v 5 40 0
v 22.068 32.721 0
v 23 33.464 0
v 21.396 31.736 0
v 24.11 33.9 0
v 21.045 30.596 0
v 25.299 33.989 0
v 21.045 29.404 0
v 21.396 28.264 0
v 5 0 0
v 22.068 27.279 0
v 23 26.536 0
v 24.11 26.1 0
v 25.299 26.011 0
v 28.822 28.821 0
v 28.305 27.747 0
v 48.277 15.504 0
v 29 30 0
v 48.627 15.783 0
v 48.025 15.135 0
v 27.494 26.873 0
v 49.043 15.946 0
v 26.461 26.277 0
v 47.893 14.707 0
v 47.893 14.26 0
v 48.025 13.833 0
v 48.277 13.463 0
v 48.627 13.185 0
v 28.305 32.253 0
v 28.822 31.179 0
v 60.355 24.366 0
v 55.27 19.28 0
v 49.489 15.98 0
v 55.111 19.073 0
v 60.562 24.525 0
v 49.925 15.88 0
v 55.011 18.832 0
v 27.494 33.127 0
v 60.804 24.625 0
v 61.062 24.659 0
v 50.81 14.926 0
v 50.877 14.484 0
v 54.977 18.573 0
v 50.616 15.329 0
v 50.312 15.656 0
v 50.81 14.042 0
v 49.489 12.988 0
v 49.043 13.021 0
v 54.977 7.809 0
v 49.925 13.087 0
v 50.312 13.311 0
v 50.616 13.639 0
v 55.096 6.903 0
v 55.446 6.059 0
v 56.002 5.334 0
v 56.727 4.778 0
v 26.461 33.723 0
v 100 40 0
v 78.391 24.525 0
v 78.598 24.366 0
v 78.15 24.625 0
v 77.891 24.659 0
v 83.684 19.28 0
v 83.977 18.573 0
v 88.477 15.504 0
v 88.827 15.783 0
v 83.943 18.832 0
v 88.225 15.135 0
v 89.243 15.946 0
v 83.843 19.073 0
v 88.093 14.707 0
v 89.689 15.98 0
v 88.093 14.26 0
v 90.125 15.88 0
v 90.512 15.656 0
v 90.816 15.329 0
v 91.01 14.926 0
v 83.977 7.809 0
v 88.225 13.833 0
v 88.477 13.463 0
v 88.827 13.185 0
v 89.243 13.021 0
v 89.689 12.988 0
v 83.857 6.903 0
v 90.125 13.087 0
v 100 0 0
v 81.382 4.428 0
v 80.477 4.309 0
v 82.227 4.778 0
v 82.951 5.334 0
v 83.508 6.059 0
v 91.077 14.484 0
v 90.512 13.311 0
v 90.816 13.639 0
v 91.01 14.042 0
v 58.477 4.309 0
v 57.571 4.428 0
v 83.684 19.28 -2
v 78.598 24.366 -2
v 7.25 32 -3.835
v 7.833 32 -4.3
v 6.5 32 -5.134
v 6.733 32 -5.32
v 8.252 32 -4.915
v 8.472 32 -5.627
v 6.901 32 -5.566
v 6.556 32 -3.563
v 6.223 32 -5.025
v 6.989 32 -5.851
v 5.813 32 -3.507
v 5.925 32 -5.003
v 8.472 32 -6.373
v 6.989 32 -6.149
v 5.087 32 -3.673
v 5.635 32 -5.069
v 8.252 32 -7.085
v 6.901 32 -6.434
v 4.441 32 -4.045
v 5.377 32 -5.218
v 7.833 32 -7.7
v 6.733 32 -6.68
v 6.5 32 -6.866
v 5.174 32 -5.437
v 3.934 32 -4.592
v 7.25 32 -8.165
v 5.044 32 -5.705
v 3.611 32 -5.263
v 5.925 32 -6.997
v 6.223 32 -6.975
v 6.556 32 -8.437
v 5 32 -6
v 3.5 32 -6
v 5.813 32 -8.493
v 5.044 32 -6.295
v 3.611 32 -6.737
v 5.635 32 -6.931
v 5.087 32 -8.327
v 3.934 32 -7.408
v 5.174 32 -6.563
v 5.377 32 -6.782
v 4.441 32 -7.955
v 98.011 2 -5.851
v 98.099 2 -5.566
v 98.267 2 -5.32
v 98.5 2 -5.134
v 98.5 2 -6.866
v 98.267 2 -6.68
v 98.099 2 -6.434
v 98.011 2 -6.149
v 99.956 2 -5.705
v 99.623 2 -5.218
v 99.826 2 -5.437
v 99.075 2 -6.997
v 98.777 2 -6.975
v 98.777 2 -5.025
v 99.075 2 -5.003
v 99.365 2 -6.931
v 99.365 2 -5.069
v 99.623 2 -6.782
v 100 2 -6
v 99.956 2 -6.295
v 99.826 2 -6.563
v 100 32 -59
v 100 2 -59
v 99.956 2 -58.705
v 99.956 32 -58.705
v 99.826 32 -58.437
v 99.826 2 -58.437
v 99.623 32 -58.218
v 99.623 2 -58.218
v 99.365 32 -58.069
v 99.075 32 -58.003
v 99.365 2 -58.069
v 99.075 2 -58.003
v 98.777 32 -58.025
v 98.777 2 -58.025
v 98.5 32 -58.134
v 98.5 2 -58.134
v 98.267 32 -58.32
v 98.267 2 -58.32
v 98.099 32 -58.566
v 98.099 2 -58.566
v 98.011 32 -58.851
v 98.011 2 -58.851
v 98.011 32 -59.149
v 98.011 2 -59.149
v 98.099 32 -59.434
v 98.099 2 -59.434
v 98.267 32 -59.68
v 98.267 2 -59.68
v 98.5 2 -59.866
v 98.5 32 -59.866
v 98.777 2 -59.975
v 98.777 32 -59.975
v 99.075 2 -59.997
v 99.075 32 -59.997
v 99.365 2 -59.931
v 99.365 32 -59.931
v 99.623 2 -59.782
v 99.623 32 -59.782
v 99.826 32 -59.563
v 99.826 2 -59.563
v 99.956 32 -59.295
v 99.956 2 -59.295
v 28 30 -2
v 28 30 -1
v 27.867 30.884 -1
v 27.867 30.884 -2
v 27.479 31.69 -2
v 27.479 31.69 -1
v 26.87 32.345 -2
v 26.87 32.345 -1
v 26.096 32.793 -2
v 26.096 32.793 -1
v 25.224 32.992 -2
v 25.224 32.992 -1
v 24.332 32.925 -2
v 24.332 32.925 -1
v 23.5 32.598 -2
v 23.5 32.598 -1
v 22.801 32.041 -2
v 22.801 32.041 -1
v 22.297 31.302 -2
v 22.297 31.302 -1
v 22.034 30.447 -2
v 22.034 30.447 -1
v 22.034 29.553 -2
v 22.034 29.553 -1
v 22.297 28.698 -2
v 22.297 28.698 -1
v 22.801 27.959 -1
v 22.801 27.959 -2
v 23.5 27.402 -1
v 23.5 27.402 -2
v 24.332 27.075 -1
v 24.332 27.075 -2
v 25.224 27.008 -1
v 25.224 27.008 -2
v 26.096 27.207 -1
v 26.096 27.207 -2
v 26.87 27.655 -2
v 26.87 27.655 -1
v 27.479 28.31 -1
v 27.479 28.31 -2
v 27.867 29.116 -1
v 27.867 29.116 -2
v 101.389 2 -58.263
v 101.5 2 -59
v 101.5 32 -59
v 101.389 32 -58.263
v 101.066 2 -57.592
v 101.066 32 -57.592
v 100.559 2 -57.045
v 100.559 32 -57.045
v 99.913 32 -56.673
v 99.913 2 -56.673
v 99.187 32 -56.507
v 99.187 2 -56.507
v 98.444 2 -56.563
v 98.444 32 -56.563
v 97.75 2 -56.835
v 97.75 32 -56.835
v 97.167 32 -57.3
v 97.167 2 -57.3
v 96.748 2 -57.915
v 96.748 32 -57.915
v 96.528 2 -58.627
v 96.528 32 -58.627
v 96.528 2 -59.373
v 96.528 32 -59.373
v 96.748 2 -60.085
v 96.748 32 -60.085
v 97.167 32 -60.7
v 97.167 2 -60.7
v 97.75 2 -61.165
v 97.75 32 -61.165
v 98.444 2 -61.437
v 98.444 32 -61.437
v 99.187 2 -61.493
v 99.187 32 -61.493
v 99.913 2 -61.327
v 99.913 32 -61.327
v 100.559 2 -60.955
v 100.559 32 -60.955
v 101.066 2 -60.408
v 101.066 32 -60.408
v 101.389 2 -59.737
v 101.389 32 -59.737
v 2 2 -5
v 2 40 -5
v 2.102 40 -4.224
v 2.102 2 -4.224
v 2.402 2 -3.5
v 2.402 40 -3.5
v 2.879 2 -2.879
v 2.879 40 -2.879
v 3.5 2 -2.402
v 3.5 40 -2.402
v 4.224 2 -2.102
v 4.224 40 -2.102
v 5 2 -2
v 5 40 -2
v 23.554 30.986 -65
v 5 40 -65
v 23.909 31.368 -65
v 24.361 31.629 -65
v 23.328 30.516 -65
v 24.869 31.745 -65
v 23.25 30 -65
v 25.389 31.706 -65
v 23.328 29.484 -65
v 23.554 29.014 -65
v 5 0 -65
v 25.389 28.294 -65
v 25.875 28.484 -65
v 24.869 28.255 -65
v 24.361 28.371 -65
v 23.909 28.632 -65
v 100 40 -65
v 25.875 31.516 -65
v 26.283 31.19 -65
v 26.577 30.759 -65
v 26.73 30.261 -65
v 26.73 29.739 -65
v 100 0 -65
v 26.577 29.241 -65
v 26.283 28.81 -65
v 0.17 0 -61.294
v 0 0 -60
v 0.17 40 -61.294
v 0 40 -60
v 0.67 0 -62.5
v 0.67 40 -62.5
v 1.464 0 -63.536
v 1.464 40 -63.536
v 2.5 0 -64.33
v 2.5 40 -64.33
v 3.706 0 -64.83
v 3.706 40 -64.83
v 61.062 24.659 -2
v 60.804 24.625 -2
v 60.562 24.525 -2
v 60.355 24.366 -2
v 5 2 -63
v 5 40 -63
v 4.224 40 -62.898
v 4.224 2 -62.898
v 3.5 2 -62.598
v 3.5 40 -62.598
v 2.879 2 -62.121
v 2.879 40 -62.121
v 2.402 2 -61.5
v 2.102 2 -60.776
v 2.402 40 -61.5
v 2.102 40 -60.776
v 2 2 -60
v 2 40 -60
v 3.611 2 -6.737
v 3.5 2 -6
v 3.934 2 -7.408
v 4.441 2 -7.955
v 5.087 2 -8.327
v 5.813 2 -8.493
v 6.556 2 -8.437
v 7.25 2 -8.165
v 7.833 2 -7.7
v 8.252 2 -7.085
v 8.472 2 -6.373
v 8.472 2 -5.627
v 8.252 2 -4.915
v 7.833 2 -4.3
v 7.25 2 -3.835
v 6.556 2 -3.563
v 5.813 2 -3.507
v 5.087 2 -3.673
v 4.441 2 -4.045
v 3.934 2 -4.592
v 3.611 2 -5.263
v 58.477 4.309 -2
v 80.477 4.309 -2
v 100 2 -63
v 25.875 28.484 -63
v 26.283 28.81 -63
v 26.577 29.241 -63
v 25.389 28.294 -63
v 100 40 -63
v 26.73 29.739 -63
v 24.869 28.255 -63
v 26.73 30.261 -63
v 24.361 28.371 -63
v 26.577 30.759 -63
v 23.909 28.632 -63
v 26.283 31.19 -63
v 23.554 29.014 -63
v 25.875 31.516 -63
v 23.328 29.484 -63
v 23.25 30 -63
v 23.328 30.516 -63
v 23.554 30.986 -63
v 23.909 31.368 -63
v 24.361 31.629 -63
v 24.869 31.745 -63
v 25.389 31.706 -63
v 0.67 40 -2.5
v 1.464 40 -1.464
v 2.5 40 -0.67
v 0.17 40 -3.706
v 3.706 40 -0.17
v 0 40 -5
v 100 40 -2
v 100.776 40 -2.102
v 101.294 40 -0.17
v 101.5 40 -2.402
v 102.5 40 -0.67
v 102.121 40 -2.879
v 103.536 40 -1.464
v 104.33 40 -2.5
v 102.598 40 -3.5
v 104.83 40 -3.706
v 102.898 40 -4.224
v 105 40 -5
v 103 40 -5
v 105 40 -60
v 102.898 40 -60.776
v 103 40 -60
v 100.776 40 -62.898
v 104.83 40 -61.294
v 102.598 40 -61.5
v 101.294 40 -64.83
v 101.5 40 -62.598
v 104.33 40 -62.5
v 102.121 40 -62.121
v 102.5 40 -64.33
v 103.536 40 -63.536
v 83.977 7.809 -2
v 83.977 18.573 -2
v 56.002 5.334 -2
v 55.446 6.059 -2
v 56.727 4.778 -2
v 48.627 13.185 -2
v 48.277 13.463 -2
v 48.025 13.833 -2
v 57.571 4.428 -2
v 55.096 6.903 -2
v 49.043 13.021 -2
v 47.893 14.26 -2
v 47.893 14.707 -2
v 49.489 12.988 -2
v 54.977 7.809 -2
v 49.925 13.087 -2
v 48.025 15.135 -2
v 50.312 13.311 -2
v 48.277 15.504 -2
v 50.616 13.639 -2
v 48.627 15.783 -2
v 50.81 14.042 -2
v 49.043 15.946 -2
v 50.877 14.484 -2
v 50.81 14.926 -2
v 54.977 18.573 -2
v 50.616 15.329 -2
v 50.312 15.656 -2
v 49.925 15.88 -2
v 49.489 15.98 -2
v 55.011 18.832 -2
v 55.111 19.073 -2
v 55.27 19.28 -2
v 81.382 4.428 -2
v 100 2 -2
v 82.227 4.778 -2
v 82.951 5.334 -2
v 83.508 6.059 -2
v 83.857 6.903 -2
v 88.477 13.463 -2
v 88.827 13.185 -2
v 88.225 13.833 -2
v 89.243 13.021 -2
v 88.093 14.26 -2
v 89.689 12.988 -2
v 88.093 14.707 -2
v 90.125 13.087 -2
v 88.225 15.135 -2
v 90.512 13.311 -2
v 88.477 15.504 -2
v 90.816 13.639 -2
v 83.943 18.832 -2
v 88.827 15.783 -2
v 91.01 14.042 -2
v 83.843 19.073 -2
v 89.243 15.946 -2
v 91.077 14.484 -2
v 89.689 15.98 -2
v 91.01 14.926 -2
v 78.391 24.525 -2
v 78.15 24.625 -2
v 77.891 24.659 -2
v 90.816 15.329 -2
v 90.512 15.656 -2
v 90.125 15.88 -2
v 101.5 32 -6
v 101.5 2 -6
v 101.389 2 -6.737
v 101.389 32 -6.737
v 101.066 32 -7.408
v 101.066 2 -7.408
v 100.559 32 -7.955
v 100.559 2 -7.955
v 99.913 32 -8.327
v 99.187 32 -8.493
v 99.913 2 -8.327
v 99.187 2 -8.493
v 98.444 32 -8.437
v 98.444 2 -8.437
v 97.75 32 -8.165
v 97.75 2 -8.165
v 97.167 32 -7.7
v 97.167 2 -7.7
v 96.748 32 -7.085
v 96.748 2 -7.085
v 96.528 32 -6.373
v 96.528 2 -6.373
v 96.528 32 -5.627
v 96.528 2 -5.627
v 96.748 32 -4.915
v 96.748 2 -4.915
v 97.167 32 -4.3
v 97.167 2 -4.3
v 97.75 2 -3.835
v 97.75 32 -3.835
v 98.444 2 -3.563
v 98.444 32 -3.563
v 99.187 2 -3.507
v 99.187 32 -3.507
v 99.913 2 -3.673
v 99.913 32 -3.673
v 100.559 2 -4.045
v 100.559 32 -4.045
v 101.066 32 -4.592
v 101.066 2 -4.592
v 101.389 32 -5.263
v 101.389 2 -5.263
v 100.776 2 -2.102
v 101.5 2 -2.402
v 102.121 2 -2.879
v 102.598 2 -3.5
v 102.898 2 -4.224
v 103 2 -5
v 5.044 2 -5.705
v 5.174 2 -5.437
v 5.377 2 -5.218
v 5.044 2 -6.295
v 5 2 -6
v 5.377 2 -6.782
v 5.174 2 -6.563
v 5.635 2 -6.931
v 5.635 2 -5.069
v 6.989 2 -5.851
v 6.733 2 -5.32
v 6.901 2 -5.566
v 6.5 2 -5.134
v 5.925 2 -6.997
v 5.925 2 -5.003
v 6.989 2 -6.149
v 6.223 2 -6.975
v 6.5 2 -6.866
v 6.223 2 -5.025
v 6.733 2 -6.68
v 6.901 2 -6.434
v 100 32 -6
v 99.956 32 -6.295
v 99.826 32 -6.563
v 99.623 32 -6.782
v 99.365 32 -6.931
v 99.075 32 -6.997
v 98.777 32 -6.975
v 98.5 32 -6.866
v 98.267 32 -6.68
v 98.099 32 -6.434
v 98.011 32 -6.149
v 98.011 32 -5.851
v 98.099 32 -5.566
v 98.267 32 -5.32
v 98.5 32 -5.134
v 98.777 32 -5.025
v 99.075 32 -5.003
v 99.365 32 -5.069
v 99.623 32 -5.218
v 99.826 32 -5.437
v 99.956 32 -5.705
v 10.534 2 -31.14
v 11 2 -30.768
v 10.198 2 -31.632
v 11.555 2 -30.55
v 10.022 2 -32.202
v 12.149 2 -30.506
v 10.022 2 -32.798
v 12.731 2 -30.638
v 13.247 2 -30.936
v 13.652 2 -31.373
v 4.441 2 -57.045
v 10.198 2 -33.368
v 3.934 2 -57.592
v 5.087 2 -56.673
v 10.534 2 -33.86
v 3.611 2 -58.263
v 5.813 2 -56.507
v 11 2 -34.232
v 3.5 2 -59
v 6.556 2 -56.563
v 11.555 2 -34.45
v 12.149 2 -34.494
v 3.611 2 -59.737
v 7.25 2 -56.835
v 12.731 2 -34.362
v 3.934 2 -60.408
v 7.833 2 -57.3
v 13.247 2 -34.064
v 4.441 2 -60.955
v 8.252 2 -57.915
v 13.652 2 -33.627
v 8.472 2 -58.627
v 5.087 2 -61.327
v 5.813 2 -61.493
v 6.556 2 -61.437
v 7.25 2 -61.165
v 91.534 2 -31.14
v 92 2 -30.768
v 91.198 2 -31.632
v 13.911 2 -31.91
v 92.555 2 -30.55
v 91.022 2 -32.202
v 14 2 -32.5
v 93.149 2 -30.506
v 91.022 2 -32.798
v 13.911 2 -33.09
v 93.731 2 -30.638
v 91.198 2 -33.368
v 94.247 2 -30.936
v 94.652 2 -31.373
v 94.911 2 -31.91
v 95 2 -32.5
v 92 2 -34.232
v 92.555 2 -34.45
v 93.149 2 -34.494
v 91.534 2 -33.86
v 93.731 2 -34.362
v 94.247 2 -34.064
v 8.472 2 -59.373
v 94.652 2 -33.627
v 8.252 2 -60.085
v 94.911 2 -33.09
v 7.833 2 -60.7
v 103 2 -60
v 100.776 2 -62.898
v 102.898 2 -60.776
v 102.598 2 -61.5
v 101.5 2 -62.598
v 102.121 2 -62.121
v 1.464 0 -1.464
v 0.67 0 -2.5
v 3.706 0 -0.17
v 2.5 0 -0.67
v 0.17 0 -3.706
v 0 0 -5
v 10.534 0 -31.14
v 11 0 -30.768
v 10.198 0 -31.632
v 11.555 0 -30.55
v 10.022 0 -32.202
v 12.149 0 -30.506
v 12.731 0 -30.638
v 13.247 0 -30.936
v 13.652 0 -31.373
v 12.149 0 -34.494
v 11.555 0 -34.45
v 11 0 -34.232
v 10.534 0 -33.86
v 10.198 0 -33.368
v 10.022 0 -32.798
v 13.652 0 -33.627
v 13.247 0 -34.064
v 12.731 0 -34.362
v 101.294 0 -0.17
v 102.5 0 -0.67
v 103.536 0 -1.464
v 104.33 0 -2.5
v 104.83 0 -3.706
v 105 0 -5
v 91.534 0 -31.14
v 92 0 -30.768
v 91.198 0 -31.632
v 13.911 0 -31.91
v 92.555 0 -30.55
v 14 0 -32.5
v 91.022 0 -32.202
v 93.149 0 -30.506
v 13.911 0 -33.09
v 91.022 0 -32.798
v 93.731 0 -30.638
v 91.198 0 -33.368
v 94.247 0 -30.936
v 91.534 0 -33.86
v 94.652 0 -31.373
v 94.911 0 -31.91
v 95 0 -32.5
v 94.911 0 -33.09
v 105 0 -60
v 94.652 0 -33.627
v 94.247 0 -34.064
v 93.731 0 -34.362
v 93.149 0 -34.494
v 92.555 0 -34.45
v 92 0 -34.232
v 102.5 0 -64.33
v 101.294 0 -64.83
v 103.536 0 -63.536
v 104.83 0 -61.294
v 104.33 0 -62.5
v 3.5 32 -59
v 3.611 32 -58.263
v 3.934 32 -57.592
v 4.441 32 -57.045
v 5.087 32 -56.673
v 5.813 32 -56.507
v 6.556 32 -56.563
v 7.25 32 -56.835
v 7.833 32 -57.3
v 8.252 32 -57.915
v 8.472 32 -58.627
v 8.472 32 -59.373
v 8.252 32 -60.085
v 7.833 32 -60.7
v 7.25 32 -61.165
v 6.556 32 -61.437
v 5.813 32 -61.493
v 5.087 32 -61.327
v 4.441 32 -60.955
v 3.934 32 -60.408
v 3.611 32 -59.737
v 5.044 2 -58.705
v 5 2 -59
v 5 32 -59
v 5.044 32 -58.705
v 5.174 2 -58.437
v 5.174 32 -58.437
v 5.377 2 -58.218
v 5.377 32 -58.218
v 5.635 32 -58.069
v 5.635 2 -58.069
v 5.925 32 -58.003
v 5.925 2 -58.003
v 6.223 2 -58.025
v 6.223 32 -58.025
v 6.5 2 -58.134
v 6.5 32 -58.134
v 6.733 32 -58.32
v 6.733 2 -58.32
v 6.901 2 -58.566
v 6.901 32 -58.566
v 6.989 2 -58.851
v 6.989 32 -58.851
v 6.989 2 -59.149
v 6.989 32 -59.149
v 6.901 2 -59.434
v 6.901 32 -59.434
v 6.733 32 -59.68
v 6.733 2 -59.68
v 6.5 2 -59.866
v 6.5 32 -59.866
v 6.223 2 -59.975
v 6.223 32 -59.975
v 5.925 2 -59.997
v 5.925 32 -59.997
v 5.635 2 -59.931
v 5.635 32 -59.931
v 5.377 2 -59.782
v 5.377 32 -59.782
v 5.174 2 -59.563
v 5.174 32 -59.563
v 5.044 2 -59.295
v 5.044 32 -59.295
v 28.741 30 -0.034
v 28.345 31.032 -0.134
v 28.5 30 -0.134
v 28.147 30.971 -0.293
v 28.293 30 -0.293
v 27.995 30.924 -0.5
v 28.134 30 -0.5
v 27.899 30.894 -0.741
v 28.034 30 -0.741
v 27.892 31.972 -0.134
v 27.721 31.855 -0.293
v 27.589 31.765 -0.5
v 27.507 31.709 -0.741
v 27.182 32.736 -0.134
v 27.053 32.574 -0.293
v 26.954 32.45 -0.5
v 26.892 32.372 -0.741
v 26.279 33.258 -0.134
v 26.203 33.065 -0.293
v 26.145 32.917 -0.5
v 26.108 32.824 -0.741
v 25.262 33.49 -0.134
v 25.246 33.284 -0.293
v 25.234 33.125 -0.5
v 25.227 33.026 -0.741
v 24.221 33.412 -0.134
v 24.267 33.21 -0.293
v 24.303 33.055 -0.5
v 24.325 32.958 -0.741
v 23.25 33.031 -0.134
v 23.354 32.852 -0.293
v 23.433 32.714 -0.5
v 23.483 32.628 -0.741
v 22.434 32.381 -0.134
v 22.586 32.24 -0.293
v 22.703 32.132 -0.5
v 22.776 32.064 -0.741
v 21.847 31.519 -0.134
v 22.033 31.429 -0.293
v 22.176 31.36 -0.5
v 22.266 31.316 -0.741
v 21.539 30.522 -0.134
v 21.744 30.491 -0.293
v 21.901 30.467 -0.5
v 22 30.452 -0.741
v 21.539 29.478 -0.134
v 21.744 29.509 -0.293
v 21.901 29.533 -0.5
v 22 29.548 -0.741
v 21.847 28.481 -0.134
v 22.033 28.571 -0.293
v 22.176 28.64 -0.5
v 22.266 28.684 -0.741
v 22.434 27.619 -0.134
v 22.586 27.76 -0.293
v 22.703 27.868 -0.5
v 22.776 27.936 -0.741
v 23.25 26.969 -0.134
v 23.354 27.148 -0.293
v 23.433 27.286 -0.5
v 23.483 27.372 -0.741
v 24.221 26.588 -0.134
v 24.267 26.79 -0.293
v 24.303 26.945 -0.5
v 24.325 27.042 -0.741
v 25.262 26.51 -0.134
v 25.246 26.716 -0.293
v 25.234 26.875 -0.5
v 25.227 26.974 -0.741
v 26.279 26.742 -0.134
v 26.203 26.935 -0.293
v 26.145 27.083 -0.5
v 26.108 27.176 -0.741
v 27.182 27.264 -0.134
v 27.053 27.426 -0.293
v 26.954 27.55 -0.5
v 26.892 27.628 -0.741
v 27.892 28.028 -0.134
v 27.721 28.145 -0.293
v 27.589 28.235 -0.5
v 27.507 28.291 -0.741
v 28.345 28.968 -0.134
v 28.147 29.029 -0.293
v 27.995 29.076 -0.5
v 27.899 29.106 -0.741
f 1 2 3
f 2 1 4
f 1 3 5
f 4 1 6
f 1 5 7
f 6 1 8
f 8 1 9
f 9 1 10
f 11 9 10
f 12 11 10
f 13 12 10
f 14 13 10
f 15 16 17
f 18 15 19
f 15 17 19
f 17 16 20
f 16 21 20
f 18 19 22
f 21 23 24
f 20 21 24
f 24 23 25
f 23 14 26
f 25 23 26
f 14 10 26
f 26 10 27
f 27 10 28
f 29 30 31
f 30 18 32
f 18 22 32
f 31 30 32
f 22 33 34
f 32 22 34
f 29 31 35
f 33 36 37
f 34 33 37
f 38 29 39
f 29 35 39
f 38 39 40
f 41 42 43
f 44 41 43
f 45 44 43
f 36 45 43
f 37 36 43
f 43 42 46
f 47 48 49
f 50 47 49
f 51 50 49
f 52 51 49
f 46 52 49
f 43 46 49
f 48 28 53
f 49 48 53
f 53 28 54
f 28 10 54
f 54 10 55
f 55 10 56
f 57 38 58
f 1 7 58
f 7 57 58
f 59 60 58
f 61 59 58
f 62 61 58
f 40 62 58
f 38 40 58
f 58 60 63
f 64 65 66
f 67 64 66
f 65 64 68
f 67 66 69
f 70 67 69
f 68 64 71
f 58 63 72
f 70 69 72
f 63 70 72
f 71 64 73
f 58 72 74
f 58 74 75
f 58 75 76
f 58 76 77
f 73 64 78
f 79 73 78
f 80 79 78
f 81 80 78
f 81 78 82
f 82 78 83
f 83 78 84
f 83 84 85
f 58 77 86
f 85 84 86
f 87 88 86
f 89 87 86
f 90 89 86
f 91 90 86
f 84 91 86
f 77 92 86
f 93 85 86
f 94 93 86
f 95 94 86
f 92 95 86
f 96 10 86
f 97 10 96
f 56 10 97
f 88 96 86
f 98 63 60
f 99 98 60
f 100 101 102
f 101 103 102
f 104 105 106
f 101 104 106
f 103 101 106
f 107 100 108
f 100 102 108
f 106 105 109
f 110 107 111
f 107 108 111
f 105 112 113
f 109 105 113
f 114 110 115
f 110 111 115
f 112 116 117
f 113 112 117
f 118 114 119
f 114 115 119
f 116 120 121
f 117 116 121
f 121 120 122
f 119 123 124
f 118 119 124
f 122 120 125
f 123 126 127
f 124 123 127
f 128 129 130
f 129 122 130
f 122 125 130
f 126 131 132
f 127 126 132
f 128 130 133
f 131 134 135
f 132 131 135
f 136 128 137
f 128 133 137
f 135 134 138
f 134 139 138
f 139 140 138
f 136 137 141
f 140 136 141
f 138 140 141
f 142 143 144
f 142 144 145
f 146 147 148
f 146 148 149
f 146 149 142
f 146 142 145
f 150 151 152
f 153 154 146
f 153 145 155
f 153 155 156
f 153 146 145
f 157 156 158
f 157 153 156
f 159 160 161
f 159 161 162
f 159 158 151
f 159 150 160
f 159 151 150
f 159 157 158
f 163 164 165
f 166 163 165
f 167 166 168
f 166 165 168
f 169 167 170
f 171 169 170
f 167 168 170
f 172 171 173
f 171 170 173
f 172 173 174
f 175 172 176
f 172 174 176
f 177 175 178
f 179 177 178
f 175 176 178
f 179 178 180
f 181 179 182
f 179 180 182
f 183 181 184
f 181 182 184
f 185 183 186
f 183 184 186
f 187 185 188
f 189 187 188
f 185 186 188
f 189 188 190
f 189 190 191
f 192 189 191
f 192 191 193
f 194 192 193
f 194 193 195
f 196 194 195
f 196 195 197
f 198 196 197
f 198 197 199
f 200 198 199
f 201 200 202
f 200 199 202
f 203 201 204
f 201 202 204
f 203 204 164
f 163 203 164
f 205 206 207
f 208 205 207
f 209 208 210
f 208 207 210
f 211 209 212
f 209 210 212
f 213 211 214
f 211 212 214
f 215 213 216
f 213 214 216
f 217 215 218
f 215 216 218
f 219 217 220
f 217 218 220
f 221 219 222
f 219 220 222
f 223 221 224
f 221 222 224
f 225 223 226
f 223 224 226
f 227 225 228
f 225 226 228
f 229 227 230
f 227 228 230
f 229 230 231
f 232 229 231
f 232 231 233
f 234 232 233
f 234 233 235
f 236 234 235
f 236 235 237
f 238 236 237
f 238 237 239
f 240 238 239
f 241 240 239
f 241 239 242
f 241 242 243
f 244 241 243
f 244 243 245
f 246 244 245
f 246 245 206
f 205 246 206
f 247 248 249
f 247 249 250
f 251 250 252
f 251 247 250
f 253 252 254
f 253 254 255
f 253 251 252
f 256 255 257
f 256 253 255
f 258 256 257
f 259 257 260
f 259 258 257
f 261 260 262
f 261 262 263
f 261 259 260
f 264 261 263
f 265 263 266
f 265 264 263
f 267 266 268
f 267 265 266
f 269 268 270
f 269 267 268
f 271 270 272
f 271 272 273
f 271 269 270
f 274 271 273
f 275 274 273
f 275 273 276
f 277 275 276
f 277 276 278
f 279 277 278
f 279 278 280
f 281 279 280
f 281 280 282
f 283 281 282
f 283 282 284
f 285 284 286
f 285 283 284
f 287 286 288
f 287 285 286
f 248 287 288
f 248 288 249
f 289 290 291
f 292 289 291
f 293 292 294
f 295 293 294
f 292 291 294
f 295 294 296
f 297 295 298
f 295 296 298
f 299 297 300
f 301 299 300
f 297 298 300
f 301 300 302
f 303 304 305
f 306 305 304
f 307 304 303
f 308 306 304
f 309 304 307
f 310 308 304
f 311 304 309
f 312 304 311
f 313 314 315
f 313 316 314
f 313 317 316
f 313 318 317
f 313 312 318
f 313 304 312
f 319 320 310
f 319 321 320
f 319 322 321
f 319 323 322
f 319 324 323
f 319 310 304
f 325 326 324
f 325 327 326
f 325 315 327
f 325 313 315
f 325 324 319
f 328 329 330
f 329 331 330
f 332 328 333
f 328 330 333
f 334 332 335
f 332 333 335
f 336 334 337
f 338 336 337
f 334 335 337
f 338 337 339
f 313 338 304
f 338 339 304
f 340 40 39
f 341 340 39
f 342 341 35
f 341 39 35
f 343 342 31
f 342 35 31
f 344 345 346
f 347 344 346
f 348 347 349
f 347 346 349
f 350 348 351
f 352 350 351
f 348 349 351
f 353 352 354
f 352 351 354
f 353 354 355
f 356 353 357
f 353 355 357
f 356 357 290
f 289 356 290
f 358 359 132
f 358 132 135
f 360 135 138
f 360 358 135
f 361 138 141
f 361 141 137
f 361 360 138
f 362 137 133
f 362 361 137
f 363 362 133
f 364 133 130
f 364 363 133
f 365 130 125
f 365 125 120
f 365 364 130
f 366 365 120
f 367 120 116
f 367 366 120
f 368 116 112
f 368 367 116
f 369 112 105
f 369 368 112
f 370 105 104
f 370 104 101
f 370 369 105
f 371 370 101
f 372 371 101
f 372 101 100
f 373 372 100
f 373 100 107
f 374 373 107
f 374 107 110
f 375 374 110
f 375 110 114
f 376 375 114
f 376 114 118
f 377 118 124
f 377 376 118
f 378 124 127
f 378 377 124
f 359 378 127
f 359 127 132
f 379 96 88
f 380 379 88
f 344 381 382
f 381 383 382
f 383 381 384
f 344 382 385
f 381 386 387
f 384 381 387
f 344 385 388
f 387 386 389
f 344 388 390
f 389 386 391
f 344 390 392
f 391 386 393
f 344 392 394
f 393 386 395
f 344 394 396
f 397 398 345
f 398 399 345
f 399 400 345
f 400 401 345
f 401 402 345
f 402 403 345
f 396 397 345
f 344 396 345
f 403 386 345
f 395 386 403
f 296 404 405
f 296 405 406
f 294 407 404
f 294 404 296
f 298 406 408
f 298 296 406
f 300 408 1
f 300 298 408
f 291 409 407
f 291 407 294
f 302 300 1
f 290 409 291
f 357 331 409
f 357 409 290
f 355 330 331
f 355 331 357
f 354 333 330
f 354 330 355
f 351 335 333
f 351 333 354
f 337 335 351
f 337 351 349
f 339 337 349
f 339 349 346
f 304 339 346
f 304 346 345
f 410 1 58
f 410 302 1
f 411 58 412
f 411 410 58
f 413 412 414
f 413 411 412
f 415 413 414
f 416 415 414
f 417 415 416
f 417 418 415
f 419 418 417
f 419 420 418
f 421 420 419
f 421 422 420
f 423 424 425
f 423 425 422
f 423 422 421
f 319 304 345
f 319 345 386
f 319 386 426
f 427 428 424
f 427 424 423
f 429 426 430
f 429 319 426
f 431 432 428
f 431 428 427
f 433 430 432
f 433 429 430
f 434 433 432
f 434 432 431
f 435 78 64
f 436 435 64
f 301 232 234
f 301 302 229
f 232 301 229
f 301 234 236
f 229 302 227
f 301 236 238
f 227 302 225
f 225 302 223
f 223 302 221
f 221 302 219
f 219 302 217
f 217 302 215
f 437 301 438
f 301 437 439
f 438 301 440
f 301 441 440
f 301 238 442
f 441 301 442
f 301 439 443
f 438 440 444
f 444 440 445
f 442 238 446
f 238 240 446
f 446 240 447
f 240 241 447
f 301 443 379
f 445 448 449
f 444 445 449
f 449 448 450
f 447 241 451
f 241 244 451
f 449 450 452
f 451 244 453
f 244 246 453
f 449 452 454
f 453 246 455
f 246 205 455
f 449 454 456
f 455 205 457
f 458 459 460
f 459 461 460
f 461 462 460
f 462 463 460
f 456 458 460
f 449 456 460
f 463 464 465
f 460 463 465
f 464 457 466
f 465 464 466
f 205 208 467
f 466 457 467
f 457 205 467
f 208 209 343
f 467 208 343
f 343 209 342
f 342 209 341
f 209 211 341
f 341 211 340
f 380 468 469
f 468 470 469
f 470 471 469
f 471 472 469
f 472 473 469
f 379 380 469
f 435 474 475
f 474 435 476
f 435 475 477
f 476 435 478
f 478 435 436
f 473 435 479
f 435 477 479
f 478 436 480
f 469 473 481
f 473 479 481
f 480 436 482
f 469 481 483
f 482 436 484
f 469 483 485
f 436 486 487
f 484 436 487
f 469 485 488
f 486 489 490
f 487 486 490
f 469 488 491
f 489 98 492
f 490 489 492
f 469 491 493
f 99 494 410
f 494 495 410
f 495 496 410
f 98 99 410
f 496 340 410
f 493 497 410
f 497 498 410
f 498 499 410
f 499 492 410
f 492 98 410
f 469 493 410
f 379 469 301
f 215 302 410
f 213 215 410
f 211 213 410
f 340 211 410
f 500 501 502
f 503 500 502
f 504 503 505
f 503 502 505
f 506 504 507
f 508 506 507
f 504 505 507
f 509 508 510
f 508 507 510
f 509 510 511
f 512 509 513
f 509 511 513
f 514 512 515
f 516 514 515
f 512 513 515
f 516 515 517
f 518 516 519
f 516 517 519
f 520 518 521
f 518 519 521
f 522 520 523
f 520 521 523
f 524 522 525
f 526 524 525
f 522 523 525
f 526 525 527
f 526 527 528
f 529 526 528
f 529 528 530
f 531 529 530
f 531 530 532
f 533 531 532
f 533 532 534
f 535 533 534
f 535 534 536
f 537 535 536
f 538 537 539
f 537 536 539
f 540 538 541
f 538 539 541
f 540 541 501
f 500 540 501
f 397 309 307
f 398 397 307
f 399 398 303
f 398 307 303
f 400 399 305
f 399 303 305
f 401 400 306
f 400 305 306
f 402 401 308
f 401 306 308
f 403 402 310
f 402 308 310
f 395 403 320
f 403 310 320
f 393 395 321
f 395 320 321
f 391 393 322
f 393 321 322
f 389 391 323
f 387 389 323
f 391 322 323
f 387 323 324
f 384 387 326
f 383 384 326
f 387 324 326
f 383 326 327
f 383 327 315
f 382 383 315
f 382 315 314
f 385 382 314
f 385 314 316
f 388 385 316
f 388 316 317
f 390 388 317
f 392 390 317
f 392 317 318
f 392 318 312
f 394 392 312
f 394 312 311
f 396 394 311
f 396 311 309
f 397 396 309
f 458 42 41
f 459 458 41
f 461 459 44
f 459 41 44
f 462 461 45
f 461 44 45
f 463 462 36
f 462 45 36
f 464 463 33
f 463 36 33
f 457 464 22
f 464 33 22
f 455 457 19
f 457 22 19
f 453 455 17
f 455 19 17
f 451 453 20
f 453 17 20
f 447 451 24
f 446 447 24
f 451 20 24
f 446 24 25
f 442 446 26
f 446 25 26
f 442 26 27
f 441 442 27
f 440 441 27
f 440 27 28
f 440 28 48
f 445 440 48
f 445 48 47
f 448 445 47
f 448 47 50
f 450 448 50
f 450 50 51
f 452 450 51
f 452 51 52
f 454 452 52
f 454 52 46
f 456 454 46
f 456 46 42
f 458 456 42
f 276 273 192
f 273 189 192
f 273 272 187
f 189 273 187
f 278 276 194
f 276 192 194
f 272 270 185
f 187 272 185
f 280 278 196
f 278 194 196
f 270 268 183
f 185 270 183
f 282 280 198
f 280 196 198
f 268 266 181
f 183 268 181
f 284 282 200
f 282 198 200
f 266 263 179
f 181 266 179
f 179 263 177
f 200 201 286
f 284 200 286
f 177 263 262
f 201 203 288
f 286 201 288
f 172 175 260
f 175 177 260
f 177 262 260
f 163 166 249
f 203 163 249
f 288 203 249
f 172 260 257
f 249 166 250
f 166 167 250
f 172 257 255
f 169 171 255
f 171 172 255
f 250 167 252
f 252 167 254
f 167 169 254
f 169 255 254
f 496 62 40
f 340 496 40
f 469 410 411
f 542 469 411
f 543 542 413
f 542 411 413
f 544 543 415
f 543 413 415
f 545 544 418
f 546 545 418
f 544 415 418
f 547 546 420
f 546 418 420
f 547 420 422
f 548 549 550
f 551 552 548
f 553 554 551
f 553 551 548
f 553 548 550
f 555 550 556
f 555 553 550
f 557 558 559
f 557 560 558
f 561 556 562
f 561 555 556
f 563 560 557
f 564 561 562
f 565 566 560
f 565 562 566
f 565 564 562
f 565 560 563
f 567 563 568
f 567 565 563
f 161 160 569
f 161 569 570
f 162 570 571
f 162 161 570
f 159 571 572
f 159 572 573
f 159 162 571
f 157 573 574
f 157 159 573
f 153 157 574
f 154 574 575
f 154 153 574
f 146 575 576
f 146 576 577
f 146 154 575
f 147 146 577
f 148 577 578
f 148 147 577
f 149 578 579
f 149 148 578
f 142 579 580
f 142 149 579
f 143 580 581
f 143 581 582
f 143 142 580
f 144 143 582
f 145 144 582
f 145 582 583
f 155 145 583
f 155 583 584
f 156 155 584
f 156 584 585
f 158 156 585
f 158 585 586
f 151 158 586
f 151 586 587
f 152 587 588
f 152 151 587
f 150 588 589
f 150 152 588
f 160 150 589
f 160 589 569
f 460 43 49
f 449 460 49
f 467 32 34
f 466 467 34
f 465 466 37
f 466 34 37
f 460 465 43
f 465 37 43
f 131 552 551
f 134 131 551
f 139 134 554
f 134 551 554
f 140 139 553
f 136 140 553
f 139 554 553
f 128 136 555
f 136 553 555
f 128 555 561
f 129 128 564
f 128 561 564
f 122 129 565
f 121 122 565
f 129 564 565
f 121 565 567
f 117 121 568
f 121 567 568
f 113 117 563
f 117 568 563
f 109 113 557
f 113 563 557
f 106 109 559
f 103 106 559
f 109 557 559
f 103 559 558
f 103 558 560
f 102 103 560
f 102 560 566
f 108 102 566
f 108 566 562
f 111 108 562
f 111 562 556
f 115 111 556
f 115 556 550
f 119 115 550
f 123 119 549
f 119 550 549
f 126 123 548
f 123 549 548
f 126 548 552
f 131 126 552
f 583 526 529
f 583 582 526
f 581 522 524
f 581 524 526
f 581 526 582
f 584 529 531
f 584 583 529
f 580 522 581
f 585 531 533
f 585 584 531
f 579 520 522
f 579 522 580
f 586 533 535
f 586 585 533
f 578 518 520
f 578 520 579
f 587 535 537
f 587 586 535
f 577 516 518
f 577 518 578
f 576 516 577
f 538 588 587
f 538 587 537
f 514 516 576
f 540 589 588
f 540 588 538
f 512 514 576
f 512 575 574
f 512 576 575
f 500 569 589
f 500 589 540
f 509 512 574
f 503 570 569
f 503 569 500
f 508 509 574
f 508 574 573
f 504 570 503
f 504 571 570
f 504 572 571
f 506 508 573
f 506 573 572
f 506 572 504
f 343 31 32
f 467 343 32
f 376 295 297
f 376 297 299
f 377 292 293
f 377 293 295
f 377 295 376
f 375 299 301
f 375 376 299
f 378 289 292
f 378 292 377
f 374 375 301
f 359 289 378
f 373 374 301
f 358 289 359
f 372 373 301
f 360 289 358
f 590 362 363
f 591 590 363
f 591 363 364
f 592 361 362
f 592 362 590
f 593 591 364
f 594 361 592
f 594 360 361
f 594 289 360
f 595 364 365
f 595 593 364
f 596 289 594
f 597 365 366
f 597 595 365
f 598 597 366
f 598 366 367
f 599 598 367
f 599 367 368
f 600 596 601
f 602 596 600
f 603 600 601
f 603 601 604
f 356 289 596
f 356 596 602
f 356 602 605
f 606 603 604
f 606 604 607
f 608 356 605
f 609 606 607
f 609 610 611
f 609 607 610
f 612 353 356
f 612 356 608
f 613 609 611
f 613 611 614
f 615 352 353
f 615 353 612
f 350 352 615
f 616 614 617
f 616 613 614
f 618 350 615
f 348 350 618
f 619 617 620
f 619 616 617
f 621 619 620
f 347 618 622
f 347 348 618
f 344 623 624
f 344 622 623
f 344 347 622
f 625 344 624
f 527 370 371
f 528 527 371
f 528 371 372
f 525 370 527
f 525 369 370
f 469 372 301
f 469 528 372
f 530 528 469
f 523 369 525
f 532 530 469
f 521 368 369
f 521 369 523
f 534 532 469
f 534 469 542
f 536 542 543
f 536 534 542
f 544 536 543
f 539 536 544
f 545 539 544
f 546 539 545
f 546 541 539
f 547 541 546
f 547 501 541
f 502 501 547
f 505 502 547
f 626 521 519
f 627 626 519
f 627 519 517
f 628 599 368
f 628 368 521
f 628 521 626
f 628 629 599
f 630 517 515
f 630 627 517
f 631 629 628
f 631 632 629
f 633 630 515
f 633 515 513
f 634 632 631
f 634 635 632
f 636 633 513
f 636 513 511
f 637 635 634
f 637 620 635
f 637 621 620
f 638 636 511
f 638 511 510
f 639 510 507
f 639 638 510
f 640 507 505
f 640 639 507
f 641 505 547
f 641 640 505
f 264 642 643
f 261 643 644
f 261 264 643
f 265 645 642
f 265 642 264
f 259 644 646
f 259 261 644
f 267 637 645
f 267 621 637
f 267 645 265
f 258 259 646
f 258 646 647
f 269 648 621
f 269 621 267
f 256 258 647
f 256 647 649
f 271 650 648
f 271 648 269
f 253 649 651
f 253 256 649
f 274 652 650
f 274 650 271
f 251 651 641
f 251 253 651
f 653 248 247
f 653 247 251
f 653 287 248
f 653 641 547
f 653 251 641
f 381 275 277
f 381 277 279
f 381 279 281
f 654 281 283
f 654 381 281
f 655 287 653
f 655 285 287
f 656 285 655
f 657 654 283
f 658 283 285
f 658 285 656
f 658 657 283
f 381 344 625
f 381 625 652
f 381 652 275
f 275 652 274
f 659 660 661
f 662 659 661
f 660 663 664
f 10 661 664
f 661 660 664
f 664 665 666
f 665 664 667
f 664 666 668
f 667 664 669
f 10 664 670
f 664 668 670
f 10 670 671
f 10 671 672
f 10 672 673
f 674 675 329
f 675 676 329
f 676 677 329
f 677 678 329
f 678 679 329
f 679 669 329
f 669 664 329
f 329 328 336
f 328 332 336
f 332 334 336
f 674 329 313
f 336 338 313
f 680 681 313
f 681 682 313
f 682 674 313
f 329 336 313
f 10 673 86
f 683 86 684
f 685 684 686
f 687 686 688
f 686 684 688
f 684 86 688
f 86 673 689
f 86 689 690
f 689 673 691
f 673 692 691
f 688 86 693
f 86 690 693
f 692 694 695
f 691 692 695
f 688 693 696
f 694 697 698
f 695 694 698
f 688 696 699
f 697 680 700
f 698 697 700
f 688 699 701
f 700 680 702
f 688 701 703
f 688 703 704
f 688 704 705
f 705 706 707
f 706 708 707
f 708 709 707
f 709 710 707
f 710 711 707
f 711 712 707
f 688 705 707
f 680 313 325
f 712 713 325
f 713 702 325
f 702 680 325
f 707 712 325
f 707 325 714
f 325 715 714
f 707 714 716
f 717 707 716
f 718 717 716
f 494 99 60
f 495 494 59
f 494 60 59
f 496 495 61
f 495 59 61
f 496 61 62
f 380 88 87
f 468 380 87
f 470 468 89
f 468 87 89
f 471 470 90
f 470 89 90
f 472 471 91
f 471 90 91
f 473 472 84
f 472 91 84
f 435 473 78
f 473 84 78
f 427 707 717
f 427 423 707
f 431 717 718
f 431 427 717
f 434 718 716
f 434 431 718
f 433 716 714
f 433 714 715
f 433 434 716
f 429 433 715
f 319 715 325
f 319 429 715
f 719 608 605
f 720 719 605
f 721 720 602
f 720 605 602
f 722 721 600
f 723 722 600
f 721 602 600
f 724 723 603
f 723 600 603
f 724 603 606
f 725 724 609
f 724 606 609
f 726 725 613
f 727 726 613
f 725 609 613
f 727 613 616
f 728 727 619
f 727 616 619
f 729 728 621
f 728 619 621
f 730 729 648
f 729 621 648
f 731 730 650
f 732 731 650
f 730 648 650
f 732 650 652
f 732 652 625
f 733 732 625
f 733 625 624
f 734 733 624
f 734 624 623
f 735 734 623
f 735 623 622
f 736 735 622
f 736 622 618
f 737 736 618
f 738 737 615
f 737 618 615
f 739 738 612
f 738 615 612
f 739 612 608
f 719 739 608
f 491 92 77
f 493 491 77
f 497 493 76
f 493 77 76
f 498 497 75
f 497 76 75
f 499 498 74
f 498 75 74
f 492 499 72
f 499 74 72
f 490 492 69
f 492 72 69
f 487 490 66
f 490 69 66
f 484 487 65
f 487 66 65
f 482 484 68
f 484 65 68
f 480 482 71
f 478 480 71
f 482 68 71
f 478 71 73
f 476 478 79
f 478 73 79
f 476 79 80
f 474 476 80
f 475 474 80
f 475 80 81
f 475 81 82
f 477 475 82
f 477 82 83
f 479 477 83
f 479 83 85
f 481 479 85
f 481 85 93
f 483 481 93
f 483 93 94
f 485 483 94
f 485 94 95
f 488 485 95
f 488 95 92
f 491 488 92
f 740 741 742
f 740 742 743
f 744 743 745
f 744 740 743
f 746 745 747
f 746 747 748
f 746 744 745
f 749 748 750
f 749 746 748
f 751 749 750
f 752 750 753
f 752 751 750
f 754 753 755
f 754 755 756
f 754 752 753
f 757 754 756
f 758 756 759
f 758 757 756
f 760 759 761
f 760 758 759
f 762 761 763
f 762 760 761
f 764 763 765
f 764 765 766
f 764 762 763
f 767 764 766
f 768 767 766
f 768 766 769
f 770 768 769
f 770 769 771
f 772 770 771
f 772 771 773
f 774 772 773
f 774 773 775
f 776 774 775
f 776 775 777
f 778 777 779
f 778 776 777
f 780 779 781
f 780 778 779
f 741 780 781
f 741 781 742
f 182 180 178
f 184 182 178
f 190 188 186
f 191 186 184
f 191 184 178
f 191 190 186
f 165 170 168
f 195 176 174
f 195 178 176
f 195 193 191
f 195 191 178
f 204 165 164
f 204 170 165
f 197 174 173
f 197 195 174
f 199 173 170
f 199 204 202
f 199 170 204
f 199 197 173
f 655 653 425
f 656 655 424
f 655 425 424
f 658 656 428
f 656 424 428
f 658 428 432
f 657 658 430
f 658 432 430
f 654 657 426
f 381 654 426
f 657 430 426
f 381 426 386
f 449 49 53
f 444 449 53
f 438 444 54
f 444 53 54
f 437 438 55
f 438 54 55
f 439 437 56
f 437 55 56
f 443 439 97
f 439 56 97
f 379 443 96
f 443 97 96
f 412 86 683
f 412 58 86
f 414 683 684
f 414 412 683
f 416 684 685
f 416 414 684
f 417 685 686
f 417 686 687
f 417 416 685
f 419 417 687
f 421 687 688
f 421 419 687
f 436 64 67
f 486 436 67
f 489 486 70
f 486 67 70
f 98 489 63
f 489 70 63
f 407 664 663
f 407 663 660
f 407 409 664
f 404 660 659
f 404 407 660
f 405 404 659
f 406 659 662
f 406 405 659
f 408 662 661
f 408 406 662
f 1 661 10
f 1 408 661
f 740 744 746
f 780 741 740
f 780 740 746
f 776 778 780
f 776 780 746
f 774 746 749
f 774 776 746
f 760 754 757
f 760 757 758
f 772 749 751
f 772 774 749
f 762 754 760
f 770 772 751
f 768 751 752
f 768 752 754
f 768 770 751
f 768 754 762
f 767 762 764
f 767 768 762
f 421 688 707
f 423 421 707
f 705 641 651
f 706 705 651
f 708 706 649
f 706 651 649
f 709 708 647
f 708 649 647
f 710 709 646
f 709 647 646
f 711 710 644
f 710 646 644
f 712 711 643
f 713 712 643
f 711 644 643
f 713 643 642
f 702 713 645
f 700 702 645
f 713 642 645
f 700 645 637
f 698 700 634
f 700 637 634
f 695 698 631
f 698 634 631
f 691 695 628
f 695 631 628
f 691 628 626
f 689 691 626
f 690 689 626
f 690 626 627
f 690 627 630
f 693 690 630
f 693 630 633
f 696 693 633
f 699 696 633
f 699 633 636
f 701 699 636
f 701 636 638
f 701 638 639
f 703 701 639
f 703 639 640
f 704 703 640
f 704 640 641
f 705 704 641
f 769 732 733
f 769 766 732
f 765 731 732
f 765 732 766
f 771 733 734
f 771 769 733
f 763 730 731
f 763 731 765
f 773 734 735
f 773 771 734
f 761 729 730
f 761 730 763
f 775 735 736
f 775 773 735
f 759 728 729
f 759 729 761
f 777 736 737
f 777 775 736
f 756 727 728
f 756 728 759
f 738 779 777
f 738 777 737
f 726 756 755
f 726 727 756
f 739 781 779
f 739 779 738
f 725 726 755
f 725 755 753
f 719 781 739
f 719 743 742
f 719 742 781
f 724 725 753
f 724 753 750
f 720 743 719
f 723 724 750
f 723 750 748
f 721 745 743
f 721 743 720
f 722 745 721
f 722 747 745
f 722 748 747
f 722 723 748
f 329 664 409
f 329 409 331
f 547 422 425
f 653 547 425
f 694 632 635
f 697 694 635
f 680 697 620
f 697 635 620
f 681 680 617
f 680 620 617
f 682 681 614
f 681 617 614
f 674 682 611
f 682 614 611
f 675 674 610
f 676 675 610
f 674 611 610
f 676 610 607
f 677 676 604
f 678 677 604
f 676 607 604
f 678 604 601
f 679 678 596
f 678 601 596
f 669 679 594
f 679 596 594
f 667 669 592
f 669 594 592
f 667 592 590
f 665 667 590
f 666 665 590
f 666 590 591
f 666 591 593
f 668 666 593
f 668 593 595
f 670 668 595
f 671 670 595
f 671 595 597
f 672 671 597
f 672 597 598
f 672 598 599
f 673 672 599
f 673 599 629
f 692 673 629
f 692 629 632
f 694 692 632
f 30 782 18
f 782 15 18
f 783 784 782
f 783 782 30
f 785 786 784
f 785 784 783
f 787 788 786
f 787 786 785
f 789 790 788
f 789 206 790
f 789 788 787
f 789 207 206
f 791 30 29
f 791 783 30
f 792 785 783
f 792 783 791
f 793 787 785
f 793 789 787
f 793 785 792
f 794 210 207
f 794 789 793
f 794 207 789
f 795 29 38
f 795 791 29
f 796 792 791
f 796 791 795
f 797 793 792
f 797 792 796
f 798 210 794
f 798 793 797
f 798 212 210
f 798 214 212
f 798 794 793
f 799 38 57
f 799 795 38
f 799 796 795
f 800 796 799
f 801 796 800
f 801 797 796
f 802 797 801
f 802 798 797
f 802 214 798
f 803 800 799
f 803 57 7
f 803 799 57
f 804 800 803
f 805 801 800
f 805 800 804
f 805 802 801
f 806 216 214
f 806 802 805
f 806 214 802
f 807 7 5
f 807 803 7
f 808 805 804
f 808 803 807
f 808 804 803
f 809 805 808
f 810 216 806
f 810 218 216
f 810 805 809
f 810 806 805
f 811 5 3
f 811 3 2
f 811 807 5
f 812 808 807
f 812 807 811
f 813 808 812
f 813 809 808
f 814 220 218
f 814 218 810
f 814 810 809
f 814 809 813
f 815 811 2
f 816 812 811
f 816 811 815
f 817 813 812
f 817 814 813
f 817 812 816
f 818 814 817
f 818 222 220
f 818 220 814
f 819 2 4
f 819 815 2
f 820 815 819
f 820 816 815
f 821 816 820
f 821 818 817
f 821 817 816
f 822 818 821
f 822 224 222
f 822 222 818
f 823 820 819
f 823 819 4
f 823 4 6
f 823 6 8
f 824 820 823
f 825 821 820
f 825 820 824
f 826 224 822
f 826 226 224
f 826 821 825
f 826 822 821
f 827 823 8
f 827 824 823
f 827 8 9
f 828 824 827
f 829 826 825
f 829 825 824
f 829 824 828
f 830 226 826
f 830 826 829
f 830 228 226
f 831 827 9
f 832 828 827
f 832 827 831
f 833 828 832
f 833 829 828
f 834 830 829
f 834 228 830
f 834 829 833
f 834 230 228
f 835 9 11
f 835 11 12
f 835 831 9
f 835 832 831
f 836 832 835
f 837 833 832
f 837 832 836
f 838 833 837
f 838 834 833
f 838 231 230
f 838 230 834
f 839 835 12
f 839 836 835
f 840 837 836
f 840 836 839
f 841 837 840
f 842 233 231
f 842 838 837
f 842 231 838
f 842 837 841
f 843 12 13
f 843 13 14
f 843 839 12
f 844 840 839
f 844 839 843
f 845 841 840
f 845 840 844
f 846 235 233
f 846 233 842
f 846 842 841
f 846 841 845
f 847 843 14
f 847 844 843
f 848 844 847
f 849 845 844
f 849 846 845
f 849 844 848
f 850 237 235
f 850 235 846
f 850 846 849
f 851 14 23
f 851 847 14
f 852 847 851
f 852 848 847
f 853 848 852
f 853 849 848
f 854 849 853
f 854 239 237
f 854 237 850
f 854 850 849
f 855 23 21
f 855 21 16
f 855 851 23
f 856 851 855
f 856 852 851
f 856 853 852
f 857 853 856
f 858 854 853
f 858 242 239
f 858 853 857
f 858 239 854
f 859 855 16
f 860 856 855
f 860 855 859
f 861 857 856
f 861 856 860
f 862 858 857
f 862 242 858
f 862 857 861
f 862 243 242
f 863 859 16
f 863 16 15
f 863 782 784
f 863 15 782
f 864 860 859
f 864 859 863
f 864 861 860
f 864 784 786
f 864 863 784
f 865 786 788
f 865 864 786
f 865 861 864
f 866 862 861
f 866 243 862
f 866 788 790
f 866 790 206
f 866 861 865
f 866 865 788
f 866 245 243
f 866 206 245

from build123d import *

# Parameters (mm, degrees)
SKETCH1_W                 = 105
SKETCH1_H                 = 65
BOSS_EXTRUDE1_DEPTH       = 40
FILLET1_R                 = 5
CUT_EXTRUDE1_DEPTH        = 38
SKETCH4_R                 = 2.5
SKETCH4_R_2               = 1
BOSS_EXTRUDE2_DEPTH       = 30
MIRROR2_COPY_1_SKETCH_R   = 2.5
MIRROR2_COPY_1_SKETCH_R_2 = 1
MIRROR2_COPY_1_DEPTH      = 30
CUT_EXTRUDE2_REACH        = 67
SKETCH7_R                 = 1.5
CUT_EXTRUDE3_REACH        = 4
SKETCH9_R                 = 2
CUT_EXTRUDE4_REACH        = 67
SKETCH12_R                = 3
FILLET2_R                 = 1
CUT_EXTRUDE5_REACH        = 67
SKETCH13_R                = 1.75


with BuildPart() as part:
    # Sketch1 → Boss-Extrude1 (new body)
    with BuildSketch(Plane(origin=(0, 0, 0), x_dir=(1, 0, 0), z_dir=(0, 1, 0))):
        with Locations((52.5, 32.5)):
            Rectangle(SKETCH1_W, SKETCH1_H)
    extrude(amount=BOSS_EXTRUDE1_DEPTH)

    # Fillet1
    fillet1_edges = [part.edges().sort_by_distance(p)[0] for p in [
        (0, 20, 0),
        (0, 20, -65),
        (105, 20, -65),
        (105, 20, 0),
    ]]
    fillet(fillet1_edges, radius=FILLET1_R)

    # Sketch3 → Cut-Extrude1 (cut)
    with BuildSketch(Plane(origin=(0, 40, 0), x_dir=(1, 0, 0), z_dir=(0, 1, 0))):
        with BuildLine():
            Line((100, 63), (5, 63))
            ThreePointArc((5, 63), (2.878679656, 62.121320344), (2, 60))
            Line((2, 60), (2, 5))
            ThreePointArc((2, 5), (2.878679656, 2.878679656), (5, 2))
            Line((5, 2), (100, 2))
            ThreePointArc((100, 2), (102.121320344, 2.878679656), (103, 5))
            Line((103, 5), (103, 60))
            ThreePointArc((103, 60), (102.121320344, 62.121320344), (100, 63))
        make_face()
    extrude(amount=-CUT_EXTRUDE1_DEPTH, mode=Mode.SUBTRACT)

    # Sketch4 → Boss-Extrude2 (add)
    with BuildSketch(Plane(origin=(0, 2, 0), x_dir=(1, 0, 0), z_dir=(0, 1, 0))):
        with Locations((99, 6)):
            Circle(SKETCH4_R)
        with Locations((99, 6)):
            Circle(SKETCH4_R_2, mode=Mode.SUBTRACT)
    boss_extrude2 = extrude(amount=BOSS_EXTRUDE2_DEPTH)

    # Mirror1: Boss-Extrude2 across plane
    add(boss_extrude2.mirror(Plane(origin=(0, 0, -32.5), x_dir=(1, 0, 0), z_dir=(0, 0, -1))))

    # Mirror2: Boss-Extrude2 across plane
    add(boss_extrude2.mirror(Plane.ZY.offset(-52.5)))

    # Mirror2 copy 1 sketch → Mirror2 copy 1 (add)
    with BuildSketch(Plane(origin=(105, 2, -65), x_dir=(-1, 0, 0), z_dir=(0, 1, 0))):
        with Locations((99, 6)):
            Circle(MIRROR2_COPY_1_SKETCH_R)
        with Locations((99, 6)):
            Circle(MIRROR2_COPY_1_SKETCH_R_2, mode=Mode.SUBTRACT)
    extrude(amount=MIRROR2_COPY_1_DEPTH)

    # Sketch7 → Cut-Extrude2 (cut, up to next)
    with BuildSketch(Plane.XY, mode=Mode.PRIVATE) as cut_extrude2_sk1:
        with Locations((89.576612985, 14.483747467)):
            Circle(SKETCH7_R)
    cut_extrude2_tool1 = extrude(cut_extrude2_sk1.sketch, amount=-CUT_EXTRUDE2_REACH, mode=Mode.PRIVATE) & part.part
    add(cut_extrude2_tool1.solids().sort_by_distance((89.576613, 14.483747, 0))[0], mode=Mode.SUBTRACT)
    # Sketch7 → Cut-Extrude2 (cut, up to next)
    with BuildSketch(Plane.XY, mode=Mode.PRIVATE) as cut_extrude2_sk2:
        with Locations((49.376612985, 14.483747467)):
            Circle(SKETCH7_R)
    cut_extrude2_tool2 = extrude(cut_extrude2_sk2.sketch, amount=-CUT_EXTRUDE2_REACH, mode=Mode.PRIVATE) & part.part
    add(cut_extrude2_tool2.solids().sort_by_distance((49.376613, 14.483747, 0))[0], mode=Mode.SUBTRACT)
    # Sketch7 → Cut-Extrude2 (cut, up to next)
    with BuildSketch(Plane.XY, mode=Mode.PRIVATE) as cut_extrude2_sk3:
        with BuildLine():
            Line((83.683719766, 19.28006781), (78.597933329, 24.365854248))
            ThreePointArc((78.597933329, 24.365854248), (78.27350998, 24.582626999), (77.890826547, 24.658747467))
            Line((77.890826547, 24.658747467), (61.062399423, 24.658747467))
            ThreePointArc((61.062399423, 24.658747467), (60.67971599, 24.582626999), (60.355292641, 24.365854248))
            Line((60.355292641, 24.365854248), (55.269506204, 19.28006781))
            ThreePointArc((55.269506204, 19.28006781), (55.052733452, 18.955644461), (54.976612985, 18.572961029))
            Line((54.976612985, 18.572961029), (54.976612985, 7.808747467))
            ThreePointArc((54.976612985, 7.808747467), (56.001739251, 5.333873733), (58.476612985, 4.308747467))
            Line((58.476612985, 4.308747467), (80.476612985, 4.308747467))
            ThreePointArc((80.476612985, 4.308747467), (82.951486719, 5.333873733), (83.976612985, 7.808747467))
            Line((83.976612985, 7.808747467), (83.976612985, 18.572961029))
            ThreePointArc((83.976612985, 18.572961029), (83.900492517, 18.955644461), (83.683719766, 19.28006781))
        make_face()
    cut_extrude2_tool3 = extrude(cut_extrude2_sk3.sketch, amount=-CUT_EXTRUDE2_REACH, mode=Mode.PRIVATE) & part.part
    add(cut_extrude2_tool3.solids().sort_by_distance((69.476613, 14.089774, 0))[0], mode=Mode.SUBTRACT)

    # Sketch9 → Cut-Extrude3 (cut, up to next)
    with BuildSketch(Plane(origin=(0, 2, 0), x_dir=(1, 0, 0), z_dir=(0, 1, 0)), mode=Mode.PRIVATE) as cut_extrude3_sk1:
        with Locations((93, 32.5)):
            Circle(SKETCH9_R)
    cut_extrude3_tool1 = extrude(cut_extrude3_sk1.sketch, amount=-CUT_EXTRUDE3_REACH, mode=Mode.PRIVATE) & part.part
    add(cut_extrude3_tool1.solids().sort_by_distance((93, 2, -32.5))[0], mode=Mode.SUBTRACT)
    # Sketch9 → Cut-Extrude3 (cut, up to next)
    with BuildSketch(Plane(origin=(0, 2, 0), x_dir=(1, 0, 0), z_dir=(0, 1, 0)), mode=Mode.PRIVATE) as cut_extrude3_sk2:
        with Locations((12, 32.5)):
            Circle(SKETCH9_R)
    cut_extrude3_tool2 = extrude(cut_extrude3_sk2.sketch, amount=-CUT_EXTRUDE3_REACH, mode=Mode.PRIVATE) & part.part
    add(cut_extrude3_tool2.solids().sort_by_distance((12, 2, -32.5))[0], mode=Mode.SUBTRACT)

    # Sketch12 → Cut-Extrude4 (cut, up to next)
    with BuildSketch(Plane.XY, mode=Mode.PRIVATE) as cut_extrude4_sk1:
        with Locations((25, 30)):
            Circle(SKETCH12_R)
    cut_extrude4_tool1 = extrude(cut_extrude4_sk1.sketch, amount=-CUT_EXTRUDE4_REACH, mode=Mode.PRIVATE) & part.part
    add(cut_extrude4_tool1.solids().sort_by_distance((25, 30, 0))[0], mode=Mode.SUBTRACT)

    # Fillet2
    fillet2_edges = [part.edges().sort_by_distance(p)[0] for p in [
        (22, 30, 0),
    ]]
    fillet(fillet2_edges, radius=FILLET2_R)

    # Sketch13 → Cut-Extrude5 (cut, up to next)
    with BuildSketch(Plane(origin=(0, 0, -65), x_dir=(-1, 0, 0), z_dir=(0, 0, -1)), mode=Mode.PRIVATE) as cut_extrude5_sk1:
        with Locations((-25, 30)):
            Circle(SKETCH13_R)
    cut_extrude5_tool1 = extrude(cut_extrude5_sk1.sketch, amount=-CUT_EXTRUDE5_REACH, mode=Mode.PRIVATE) & part.part
    add(cut_extrude5_tool1.solids().sort_by_distance((25, 30, -65))[0], mode=Mode.SUBTRACT)


solid = part.part
